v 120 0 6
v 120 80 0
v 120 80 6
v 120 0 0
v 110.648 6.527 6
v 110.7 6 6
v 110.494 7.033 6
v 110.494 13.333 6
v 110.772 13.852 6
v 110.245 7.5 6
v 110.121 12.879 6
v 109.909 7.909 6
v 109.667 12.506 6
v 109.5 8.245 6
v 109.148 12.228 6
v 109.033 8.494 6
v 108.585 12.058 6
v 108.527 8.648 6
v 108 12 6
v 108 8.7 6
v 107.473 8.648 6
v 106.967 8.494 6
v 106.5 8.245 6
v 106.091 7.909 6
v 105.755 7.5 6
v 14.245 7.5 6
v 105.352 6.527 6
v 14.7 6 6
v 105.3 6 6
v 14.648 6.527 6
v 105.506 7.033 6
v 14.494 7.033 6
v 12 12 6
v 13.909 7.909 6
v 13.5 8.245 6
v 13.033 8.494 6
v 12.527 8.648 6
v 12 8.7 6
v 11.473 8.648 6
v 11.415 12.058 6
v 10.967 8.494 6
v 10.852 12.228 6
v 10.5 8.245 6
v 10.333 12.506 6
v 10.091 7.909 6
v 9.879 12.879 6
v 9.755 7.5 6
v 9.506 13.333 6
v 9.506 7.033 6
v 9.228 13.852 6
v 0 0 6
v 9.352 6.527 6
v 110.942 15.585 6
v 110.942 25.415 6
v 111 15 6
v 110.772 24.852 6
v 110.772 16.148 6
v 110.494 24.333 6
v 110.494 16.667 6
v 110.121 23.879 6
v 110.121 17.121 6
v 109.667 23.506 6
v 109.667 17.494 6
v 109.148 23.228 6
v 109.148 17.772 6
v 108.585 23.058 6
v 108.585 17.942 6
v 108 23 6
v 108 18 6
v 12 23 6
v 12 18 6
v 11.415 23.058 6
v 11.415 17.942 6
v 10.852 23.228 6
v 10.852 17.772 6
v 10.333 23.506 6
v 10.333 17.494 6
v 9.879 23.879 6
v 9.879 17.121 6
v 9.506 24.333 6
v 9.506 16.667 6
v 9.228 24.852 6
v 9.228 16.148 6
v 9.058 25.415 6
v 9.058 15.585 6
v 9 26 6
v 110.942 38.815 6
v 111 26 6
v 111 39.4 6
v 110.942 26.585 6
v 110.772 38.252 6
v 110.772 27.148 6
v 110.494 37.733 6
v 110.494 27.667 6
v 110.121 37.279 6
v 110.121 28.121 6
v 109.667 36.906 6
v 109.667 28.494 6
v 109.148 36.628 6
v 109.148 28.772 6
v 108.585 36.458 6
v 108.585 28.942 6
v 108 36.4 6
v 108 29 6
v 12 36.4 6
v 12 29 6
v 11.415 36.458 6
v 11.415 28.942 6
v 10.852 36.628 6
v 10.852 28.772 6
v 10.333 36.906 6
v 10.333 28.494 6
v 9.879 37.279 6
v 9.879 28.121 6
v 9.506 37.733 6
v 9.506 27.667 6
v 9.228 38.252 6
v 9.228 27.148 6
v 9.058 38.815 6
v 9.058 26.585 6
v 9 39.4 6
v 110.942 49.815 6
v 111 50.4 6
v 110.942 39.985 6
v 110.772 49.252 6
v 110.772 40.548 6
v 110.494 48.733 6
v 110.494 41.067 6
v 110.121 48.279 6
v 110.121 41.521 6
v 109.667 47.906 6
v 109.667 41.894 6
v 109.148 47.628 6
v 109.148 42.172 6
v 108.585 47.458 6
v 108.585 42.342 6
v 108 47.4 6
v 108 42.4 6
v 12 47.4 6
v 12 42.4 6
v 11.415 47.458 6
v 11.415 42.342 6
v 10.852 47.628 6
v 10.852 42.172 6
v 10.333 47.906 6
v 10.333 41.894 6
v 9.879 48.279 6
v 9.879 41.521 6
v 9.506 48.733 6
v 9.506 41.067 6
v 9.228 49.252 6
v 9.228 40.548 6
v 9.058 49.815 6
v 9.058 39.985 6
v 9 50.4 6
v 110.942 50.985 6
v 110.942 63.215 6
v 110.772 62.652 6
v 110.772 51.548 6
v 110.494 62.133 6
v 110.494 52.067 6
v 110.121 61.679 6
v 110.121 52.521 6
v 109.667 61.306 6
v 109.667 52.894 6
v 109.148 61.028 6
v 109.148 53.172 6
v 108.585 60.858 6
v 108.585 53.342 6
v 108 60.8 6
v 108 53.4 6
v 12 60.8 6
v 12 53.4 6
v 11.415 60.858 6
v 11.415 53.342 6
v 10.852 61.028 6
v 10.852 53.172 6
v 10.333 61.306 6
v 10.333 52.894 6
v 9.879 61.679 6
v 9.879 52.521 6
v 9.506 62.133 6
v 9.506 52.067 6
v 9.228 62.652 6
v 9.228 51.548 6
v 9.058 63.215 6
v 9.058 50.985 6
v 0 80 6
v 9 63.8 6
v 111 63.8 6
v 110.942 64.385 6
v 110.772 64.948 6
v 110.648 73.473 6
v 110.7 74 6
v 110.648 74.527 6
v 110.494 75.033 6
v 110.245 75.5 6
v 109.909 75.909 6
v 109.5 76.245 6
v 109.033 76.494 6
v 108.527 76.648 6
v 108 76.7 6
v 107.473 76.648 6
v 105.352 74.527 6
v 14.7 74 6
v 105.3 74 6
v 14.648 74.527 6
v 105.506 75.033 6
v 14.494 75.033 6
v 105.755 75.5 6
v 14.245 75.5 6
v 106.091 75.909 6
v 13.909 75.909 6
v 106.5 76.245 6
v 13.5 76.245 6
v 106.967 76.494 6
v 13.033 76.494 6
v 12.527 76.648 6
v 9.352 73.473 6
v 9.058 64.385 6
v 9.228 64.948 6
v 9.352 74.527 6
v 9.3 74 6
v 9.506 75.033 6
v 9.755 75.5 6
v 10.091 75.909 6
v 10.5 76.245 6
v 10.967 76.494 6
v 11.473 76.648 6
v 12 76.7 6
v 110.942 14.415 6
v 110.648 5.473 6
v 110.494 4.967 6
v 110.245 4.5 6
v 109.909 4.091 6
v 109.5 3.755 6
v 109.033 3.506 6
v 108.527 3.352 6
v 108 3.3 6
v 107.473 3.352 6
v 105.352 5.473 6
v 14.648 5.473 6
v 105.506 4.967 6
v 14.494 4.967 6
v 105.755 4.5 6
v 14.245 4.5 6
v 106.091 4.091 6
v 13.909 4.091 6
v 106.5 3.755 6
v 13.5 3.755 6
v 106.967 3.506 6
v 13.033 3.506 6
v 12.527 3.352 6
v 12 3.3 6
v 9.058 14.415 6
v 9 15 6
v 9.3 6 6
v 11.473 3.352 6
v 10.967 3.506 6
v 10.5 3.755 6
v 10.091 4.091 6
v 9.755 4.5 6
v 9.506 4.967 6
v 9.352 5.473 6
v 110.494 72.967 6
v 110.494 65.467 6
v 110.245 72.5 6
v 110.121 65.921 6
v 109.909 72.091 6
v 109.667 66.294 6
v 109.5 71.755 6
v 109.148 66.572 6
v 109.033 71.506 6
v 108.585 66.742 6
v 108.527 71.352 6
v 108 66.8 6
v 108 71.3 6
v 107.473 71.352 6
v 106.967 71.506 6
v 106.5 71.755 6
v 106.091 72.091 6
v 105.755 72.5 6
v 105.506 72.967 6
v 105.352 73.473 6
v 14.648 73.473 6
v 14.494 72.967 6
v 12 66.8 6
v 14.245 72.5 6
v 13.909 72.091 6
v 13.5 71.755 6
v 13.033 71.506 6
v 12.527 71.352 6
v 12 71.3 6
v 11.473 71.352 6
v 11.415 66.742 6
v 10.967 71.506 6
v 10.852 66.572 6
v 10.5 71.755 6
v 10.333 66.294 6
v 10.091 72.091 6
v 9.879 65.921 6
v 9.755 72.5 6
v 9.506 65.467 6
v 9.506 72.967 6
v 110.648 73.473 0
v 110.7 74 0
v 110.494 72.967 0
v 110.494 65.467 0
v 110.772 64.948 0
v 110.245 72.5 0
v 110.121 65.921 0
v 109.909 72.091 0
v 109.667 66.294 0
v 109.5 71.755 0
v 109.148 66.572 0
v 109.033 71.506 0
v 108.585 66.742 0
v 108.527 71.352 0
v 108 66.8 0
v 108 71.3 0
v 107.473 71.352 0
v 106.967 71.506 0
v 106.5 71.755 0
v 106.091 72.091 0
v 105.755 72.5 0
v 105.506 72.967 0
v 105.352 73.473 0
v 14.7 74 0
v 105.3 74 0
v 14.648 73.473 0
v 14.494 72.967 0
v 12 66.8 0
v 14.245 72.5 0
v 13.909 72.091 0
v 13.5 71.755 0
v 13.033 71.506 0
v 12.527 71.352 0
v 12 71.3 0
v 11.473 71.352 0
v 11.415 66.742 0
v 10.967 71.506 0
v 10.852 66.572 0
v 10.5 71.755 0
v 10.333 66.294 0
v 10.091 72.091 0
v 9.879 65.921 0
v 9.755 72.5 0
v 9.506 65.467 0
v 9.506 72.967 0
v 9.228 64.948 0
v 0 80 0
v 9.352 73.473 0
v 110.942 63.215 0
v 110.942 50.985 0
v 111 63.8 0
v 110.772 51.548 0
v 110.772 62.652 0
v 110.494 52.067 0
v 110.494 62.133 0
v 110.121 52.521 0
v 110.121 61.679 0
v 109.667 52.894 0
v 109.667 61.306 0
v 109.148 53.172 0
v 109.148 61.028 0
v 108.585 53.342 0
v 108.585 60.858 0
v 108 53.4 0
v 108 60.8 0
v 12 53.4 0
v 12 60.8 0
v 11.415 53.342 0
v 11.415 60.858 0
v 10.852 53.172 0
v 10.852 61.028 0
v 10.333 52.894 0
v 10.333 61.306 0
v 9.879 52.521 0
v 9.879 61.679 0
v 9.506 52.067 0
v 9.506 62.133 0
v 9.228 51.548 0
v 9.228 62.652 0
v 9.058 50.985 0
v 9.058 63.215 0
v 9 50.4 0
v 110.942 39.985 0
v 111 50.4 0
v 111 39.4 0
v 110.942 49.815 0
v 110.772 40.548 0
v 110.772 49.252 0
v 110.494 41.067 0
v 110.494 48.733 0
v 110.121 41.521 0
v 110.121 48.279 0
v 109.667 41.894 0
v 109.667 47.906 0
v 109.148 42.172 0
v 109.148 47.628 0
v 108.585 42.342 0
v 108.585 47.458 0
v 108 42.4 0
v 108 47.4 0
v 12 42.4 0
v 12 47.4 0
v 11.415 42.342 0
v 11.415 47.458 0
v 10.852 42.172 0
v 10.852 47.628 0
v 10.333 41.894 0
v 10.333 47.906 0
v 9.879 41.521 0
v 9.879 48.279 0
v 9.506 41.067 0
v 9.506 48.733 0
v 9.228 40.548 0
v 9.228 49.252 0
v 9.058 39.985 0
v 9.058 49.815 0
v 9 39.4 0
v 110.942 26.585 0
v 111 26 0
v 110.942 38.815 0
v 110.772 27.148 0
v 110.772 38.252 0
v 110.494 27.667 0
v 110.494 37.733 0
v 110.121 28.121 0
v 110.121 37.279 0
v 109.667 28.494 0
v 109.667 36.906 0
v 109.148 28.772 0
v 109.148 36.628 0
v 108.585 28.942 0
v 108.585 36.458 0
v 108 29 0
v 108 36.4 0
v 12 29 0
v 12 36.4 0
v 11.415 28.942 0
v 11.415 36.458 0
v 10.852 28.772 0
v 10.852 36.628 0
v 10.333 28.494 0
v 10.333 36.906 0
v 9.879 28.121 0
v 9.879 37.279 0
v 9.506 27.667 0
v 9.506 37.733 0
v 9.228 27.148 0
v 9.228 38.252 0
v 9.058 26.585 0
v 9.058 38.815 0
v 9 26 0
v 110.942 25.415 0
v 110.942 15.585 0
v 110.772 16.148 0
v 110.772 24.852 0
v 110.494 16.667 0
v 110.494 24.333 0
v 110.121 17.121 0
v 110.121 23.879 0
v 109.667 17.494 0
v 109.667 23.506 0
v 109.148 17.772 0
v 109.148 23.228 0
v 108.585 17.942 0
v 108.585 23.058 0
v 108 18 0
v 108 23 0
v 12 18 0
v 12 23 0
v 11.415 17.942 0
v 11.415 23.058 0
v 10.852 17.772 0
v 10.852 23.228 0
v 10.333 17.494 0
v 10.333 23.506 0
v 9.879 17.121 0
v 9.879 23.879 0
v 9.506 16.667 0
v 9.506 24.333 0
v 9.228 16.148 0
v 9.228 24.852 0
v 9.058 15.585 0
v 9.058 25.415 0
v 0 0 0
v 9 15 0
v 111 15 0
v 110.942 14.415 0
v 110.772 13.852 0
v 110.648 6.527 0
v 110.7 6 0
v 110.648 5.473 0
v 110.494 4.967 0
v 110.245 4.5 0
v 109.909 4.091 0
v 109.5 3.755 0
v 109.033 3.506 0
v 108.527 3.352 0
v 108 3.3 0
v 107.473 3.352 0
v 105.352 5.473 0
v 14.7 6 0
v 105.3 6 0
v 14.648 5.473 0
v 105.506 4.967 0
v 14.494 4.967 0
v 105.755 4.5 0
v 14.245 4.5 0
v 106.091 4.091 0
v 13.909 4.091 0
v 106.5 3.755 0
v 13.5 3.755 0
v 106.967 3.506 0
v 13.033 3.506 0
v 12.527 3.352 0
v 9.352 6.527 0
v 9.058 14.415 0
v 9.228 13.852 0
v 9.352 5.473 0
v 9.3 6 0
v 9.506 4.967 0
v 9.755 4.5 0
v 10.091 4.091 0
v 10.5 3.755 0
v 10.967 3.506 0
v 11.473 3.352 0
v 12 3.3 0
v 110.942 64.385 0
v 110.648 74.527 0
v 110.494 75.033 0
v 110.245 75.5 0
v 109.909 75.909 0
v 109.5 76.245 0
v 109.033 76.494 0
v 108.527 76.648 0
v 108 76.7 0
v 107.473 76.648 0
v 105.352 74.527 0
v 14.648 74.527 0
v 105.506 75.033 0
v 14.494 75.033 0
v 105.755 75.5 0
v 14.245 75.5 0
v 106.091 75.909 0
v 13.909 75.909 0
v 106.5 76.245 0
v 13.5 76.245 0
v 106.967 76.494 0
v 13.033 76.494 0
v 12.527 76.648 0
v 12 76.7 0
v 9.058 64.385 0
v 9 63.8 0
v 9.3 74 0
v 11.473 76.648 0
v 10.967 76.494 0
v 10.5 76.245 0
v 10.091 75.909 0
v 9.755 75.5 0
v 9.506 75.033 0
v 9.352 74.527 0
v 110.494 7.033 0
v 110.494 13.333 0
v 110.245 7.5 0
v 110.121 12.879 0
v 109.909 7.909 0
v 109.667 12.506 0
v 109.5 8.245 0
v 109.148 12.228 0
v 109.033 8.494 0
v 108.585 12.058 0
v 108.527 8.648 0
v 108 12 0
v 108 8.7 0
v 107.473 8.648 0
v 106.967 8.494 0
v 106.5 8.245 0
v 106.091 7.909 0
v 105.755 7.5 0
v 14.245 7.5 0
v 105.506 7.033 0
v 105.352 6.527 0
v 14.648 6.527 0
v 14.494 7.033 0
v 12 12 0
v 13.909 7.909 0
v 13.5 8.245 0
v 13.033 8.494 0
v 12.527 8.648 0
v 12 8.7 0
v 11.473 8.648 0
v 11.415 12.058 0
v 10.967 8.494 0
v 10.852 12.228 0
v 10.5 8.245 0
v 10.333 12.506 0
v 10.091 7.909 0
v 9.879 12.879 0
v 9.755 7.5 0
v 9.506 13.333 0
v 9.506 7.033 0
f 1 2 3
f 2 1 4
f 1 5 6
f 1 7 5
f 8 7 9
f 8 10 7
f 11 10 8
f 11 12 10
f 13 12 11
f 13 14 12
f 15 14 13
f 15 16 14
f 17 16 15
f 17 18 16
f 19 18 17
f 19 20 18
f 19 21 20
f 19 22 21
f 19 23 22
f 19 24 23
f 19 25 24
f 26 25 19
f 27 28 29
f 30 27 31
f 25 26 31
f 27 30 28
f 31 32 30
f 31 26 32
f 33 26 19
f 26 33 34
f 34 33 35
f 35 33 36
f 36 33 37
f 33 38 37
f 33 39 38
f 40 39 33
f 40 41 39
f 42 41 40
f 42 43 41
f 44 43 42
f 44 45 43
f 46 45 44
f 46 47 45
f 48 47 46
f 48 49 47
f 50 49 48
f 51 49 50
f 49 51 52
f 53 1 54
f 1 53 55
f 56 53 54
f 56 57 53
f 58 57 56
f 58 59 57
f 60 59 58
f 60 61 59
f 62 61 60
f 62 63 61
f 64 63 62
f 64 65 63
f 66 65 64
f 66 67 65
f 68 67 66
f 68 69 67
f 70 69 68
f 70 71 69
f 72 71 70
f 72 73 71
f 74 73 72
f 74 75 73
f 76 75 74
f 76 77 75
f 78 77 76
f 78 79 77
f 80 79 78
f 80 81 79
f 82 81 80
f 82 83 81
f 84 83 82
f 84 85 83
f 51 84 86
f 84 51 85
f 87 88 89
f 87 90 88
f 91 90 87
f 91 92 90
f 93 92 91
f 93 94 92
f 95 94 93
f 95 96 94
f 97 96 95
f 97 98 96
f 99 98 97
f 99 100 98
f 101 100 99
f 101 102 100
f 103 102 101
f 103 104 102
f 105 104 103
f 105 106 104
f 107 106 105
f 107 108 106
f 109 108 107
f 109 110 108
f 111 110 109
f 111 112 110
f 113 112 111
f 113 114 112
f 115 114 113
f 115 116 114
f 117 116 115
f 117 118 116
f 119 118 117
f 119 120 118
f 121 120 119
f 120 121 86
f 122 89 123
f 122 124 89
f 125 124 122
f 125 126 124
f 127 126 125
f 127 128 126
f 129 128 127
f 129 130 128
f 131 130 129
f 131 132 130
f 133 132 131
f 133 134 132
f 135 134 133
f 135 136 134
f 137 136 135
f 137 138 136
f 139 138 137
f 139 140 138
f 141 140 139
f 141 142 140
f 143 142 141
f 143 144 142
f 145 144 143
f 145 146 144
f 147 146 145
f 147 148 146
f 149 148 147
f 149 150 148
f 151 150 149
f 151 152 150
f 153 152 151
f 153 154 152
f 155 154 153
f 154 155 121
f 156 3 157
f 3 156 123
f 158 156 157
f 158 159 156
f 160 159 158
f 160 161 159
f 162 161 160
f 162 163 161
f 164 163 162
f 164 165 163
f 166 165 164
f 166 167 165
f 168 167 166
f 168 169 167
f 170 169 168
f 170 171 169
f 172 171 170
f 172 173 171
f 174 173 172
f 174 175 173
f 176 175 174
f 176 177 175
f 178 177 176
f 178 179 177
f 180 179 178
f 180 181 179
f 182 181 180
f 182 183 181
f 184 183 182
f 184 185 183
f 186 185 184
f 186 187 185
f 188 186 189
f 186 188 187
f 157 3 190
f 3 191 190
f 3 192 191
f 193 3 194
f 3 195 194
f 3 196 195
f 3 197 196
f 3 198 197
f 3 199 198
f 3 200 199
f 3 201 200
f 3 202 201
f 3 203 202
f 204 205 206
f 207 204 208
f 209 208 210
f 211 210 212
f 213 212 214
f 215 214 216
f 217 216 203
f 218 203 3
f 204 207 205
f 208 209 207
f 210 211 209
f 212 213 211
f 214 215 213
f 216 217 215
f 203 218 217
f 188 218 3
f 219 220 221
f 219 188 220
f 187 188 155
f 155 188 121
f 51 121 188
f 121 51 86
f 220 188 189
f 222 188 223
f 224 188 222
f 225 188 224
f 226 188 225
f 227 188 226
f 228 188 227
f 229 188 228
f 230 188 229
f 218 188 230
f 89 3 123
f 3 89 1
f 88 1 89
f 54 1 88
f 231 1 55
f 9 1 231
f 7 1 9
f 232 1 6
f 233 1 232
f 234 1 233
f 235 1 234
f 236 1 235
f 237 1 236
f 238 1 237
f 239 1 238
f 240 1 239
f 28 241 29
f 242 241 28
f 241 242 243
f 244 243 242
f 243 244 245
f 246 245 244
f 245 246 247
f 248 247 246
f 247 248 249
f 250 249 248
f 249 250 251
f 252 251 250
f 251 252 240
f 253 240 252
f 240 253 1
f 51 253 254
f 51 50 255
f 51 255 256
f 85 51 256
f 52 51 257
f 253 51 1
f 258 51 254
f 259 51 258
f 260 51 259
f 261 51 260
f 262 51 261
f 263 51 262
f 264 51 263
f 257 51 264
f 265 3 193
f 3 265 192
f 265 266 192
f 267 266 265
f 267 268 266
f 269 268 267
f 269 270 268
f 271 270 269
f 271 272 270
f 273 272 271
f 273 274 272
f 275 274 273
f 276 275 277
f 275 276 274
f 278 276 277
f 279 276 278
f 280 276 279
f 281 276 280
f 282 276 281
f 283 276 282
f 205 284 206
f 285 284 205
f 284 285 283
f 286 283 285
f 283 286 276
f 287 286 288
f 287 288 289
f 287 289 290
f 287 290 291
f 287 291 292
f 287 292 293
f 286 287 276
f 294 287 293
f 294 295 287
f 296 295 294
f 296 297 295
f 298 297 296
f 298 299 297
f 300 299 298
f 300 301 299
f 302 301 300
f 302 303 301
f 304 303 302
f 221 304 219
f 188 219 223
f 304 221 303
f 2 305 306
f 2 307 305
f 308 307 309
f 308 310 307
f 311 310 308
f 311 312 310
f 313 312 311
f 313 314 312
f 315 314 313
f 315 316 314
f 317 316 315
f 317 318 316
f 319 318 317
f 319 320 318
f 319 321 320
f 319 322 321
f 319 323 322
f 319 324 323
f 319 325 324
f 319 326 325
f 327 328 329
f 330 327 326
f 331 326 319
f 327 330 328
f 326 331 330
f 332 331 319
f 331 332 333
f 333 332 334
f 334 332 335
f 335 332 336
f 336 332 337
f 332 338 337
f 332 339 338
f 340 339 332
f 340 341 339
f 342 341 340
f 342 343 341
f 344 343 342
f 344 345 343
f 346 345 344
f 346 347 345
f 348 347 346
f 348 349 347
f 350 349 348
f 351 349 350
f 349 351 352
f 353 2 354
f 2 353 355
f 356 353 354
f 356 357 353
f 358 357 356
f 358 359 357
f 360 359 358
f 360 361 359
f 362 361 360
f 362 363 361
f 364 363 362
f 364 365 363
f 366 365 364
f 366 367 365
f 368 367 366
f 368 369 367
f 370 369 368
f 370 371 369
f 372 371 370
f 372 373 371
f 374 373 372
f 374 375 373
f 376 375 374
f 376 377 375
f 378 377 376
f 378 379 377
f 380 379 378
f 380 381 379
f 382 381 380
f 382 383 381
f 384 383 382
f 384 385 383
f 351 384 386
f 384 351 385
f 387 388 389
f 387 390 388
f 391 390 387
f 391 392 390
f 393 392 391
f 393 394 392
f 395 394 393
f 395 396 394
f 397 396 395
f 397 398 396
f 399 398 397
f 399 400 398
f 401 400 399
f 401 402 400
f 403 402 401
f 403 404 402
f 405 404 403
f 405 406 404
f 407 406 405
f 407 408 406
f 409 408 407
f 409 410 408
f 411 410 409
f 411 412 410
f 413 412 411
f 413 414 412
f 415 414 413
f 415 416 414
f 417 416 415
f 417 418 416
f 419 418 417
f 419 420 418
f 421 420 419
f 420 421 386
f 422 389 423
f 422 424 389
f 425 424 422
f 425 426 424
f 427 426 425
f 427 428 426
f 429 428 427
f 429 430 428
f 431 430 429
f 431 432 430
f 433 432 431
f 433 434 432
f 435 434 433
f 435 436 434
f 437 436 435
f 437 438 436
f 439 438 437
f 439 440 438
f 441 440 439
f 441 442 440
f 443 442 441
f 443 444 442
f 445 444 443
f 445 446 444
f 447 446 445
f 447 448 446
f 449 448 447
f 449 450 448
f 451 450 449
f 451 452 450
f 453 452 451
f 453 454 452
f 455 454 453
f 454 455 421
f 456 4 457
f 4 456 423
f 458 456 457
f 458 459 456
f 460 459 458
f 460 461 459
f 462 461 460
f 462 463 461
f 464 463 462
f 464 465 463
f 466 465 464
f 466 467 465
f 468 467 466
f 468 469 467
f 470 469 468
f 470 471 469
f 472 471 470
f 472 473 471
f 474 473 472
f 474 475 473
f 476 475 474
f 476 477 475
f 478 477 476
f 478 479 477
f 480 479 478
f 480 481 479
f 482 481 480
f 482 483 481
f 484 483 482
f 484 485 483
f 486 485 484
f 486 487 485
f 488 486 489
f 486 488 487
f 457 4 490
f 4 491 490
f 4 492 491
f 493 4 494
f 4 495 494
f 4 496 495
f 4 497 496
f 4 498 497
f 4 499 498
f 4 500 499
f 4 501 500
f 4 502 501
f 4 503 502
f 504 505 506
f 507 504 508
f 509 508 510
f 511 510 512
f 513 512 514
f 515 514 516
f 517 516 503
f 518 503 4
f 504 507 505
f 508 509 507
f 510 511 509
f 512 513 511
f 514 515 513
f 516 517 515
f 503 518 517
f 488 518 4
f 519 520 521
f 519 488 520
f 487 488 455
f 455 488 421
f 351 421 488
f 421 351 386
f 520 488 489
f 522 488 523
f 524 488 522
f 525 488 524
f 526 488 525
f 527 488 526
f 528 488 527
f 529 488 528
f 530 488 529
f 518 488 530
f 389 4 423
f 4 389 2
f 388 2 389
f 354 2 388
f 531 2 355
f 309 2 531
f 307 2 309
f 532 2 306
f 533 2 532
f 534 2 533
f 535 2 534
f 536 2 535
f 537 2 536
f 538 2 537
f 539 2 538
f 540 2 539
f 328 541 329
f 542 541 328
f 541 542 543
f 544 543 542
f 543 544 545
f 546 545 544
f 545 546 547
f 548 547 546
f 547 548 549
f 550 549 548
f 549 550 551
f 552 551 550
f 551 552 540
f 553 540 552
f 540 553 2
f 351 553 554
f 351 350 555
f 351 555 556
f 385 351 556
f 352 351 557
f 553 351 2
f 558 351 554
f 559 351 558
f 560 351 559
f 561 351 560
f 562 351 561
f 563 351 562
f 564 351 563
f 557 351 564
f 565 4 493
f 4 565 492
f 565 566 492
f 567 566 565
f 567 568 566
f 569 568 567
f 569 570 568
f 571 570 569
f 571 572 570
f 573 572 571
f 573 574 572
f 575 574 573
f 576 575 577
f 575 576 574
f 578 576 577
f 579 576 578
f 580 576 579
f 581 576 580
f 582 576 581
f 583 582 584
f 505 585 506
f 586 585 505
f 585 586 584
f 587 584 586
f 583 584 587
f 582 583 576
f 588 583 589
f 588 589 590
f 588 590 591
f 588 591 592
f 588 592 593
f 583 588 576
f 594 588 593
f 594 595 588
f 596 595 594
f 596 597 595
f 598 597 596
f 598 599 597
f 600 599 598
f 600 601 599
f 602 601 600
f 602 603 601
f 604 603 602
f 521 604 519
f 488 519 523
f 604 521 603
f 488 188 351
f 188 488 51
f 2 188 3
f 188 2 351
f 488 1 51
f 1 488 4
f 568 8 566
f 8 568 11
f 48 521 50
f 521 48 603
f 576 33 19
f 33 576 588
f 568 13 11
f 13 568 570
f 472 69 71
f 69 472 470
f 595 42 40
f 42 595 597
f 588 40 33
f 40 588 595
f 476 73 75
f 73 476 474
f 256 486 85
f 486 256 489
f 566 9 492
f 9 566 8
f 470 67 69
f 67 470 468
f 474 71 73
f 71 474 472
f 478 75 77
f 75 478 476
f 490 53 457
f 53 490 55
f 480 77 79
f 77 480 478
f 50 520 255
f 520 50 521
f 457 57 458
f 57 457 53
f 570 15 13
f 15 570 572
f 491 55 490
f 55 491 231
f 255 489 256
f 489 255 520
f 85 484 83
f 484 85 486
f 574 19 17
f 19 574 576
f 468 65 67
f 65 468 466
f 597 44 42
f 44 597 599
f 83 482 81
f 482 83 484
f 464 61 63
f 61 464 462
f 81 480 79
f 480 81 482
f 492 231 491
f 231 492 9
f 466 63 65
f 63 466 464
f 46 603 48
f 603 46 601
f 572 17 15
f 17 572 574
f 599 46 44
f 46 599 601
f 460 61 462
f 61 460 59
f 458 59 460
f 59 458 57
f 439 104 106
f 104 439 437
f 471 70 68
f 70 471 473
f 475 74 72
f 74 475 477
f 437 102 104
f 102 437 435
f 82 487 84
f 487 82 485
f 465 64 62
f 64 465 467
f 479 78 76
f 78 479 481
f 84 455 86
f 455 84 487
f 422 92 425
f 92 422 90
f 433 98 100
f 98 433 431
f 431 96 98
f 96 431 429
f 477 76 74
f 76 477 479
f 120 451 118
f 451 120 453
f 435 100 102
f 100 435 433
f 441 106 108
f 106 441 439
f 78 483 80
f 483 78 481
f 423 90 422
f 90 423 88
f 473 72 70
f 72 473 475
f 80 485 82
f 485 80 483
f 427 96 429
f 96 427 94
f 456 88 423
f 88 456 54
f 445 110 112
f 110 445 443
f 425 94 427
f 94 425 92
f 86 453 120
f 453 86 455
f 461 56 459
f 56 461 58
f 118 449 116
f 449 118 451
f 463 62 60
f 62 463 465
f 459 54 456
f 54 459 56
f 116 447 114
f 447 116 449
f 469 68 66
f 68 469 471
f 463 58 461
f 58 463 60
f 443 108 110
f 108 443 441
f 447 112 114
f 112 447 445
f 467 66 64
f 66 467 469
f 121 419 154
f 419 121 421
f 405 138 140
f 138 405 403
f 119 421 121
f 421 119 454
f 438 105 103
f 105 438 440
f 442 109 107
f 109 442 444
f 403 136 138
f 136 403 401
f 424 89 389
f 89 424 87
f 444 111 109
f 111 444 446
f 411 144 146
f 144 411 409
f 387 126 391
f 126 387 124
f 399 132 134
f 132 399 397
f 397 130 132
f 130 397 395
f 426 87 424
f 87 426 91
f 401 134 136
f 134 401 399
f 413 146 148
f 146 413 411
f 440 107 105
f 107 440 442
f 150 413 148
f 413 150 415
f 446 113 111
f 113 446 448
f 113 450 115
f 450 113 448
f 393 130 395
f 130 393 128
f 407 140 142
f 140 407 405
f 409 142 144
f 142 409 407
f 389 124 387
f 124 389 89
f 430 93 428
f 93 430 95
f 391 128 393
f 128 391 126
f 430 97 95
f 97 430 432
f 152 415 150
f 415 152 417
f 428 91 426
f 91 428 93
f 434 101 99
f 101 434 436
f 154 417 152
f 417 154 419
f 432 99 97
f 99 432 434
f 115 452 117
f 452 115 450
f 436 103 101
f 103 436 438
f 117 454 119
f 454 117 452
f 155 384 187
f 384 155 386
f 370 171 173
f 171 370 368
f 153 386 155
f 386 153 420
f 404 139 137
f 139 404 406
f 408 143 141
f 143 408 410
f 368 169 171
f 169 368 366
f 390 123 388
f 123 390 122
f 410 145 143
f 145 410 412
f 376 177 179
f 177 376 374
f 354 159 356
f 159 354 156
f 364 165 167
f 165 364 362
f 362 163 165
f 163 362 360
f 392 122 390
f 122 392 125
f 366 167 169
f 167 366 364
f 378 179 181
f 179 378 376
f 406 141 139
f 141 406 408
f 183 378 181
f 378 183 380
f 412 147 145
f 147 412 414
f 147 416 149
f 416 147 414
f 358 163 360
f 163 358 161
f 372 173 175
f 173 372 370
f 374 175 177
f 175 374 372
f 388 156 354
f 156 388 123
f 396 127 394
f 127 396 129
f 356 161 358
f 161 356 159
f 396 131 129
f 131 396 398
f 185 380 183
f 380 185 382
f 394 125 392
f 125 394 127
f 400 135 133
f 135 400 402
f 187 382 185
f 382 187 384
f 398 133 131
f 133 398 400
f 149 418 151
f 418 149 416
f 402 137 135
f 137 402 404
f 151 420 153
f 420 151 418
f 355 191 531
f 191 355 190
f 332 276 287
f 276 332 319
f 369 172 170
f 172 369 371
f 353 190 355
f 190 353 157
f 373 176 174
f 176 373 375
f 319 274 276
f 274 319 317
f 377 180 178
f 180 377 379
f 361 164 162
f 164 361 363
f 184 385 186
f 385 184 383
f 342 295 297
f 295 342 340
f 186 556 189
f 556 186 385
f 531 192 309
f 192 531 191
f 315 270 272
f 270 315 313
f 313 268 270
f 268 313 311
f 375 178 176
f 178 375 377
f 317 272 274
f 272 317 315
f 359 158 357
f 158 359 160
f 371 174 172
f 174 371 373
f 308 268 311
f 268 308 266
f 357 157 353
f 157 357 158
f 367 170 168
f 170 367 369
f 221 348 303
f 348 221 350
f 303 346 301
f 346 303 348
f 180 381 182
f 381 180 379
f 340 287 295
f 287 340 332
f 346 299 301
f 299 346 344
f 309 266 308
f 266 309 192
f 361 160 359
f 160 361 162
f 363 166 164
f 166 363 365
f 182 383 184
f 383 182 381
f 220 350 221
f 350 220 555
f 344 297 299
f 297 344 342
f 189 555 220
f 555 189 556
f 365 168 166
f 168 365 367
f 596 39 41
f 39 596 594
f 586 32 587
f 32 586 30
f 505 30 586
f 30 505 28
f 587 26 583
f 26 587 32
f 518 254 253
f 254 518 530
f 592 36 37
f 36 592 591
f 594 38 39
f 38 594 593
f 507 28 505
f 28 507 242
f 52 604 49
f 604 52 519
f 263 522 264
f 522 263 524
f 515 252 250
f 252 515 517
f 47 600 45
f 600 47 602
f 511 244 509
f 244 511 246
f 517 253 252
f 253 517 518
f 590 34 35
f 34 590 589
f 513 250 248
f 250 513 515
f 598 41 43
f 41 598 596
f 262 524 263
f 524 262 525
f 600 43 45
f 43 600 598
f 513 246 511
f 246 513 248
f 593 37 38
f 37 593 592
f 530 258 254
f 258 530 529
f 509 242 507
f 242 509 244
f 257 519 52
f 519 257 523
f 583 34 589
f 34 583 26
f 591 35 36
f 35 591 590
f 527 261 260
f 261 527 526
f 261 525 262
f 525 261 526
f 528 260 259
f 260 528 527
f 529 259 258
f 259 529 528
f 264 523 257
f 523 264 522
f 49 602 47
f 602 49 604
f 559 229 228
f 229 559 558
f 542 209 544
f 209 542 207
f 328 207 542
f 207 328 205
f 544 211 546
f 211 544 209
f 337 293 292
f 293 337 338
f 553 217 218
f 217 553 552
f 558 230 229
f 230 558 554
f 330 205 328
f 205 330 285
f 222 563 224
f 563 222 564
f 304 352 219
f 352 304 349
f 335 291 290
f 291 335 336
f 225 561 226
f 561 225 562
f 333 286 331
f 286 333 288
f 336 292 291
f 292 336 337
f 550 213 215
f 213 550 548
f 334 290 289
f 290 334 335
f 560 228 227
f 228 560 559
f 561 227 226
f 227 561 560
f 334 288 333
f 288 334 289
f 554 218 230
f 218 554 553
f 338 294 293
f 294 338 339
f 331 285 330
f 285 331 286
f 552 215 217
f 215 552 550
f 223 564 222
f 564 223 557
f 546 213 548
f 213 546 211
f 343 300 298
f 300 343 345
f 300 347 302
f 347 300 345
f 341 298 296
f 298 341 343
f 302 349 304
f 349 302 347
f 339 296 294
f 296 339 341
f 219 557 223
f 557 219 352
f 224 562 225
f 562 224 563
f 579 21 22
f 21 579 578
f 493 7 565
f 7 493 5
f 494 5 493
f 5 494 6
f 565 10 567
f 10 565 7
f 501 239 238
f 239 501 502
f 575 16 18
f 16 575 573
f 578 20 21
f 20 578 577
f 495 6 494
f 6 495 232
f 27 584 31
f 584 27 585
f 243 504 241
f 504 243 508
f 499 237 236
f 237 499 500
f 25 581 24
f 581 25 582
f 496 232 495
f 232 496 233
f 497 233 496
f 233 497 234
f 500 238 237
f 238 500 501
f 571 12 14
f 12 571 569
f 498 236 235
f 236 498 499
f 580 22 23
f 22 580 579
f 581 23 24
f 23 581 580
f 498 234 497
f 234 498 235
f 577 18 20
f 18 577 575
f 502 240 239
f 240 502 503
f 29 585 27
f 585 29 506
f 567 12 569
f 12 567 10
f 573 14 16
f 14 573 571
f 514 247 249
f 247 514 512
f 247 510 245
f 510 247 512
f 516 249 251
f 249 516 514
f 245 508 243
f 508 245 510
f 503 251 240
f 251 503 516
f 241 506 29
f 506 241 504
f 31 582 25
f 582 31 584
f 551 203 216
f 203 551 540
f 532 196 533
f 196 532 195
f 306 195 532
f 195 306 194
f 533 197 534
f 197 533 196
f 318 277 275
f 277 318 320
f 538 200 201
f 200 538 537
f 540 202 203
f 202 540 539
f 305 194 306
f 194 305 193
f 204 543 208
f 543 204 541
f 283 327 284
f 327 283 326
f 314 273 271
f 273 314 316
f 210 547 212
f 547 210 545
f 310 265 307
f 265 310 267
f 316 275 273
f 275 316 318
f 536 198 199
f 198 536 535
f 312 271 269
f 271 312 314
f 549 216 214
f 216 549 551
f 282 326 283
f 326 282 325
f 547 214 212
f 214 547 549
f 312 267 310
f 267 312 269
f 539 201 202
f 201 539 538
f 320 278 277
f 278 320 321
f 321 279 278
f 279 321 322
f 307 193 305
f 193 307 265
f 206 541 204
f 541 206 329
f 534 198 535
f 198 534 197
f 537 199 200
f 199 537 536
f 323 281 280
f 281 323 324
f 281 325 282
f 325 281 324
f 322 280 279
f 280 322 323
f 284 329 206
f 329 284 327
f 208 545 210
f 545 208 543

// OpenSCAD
$fn = 32;

// ----------------------------------------------------------------------
// Slotted panel: 120 x 80 mm, 5 рядов of slots
// ----------------------------------------------------------------------

// --- parameters (mm) ---
panel_w = 120;            // panel width
panel_d = 80;             // panel depth
thick = 6;                // panel thickness
slot_w = 6;               // slot width
pitch0 = 11;              // first row pitch
pitch_step = 2.4;         // pitch increase per row
margin = 12;              // margin around the slot field
rows = 5;                 // number of slot rows
mount_d = 5.4;            // mounting holes
mount_x = 48;             // mounting hole offset

difference() {
  union() {
    cube([panel_w, panel_d, thick]);
  }
  /* slot rows: stadium shaped cutters, 2.5 mm clear of both faces */
  /* row 0: pitch 11, length 96 */
  hull() {
    translate([12, 15, -2.5]) cylinder(h = thick + 5, d = slot_w);
    translate([108, 15, -2.5]) cylinder(h = thick + 5, d = slot_w);
  }
  /* row 1: pitch 13.4, length 96 */
  hull() {
    translate([12, 26, -2.5]) cylinder(h = thick + 5, d = slot_w);
    translate([108, 26, -2.5]) cylinder(h = thick + 5, d = slot_w);
  }
  /* row 2: pitch 11, length 96 */
  hull() {
    translate([12, 39.4, -2.5]) cylinder(h = thick + 5, d = slot_w);
    translate([108, 39.4, -2.5]) cylinder(h = thick + 5, d = slot_w);
  }
  /* row 3: pitch 13.4, length 96 */
  hull() {
    translate([12, 50.4, -2.5]) cylinder(h = thick + 5, d = slot_w);
    translate([108, 50.4, -2.5]) cylinder(h = thick + 5, d = slot_w);
  }
  /* row 4: pitch 11, length 96 */
  hull() {
    translate([12, 63.8, -2.5]) cylinder(h = thick + 5, d = slot_w);
    translate([108, 63.8, -2.5]) cylinder(h = thick + 5, d = slot_w);
  }
  translate([12, 6, -2.5]) cylinder(h = 11, d = mount_d);
  translate([12, 74, -2.5]) cylinder(h = 11, d = mount_d);
  translate([108, 6, -2.5]) cylinder(h = 11, d = mount_d);
  translate([108, 74, -2.5]) cylinder(h = 11, d = mount_d);
}
